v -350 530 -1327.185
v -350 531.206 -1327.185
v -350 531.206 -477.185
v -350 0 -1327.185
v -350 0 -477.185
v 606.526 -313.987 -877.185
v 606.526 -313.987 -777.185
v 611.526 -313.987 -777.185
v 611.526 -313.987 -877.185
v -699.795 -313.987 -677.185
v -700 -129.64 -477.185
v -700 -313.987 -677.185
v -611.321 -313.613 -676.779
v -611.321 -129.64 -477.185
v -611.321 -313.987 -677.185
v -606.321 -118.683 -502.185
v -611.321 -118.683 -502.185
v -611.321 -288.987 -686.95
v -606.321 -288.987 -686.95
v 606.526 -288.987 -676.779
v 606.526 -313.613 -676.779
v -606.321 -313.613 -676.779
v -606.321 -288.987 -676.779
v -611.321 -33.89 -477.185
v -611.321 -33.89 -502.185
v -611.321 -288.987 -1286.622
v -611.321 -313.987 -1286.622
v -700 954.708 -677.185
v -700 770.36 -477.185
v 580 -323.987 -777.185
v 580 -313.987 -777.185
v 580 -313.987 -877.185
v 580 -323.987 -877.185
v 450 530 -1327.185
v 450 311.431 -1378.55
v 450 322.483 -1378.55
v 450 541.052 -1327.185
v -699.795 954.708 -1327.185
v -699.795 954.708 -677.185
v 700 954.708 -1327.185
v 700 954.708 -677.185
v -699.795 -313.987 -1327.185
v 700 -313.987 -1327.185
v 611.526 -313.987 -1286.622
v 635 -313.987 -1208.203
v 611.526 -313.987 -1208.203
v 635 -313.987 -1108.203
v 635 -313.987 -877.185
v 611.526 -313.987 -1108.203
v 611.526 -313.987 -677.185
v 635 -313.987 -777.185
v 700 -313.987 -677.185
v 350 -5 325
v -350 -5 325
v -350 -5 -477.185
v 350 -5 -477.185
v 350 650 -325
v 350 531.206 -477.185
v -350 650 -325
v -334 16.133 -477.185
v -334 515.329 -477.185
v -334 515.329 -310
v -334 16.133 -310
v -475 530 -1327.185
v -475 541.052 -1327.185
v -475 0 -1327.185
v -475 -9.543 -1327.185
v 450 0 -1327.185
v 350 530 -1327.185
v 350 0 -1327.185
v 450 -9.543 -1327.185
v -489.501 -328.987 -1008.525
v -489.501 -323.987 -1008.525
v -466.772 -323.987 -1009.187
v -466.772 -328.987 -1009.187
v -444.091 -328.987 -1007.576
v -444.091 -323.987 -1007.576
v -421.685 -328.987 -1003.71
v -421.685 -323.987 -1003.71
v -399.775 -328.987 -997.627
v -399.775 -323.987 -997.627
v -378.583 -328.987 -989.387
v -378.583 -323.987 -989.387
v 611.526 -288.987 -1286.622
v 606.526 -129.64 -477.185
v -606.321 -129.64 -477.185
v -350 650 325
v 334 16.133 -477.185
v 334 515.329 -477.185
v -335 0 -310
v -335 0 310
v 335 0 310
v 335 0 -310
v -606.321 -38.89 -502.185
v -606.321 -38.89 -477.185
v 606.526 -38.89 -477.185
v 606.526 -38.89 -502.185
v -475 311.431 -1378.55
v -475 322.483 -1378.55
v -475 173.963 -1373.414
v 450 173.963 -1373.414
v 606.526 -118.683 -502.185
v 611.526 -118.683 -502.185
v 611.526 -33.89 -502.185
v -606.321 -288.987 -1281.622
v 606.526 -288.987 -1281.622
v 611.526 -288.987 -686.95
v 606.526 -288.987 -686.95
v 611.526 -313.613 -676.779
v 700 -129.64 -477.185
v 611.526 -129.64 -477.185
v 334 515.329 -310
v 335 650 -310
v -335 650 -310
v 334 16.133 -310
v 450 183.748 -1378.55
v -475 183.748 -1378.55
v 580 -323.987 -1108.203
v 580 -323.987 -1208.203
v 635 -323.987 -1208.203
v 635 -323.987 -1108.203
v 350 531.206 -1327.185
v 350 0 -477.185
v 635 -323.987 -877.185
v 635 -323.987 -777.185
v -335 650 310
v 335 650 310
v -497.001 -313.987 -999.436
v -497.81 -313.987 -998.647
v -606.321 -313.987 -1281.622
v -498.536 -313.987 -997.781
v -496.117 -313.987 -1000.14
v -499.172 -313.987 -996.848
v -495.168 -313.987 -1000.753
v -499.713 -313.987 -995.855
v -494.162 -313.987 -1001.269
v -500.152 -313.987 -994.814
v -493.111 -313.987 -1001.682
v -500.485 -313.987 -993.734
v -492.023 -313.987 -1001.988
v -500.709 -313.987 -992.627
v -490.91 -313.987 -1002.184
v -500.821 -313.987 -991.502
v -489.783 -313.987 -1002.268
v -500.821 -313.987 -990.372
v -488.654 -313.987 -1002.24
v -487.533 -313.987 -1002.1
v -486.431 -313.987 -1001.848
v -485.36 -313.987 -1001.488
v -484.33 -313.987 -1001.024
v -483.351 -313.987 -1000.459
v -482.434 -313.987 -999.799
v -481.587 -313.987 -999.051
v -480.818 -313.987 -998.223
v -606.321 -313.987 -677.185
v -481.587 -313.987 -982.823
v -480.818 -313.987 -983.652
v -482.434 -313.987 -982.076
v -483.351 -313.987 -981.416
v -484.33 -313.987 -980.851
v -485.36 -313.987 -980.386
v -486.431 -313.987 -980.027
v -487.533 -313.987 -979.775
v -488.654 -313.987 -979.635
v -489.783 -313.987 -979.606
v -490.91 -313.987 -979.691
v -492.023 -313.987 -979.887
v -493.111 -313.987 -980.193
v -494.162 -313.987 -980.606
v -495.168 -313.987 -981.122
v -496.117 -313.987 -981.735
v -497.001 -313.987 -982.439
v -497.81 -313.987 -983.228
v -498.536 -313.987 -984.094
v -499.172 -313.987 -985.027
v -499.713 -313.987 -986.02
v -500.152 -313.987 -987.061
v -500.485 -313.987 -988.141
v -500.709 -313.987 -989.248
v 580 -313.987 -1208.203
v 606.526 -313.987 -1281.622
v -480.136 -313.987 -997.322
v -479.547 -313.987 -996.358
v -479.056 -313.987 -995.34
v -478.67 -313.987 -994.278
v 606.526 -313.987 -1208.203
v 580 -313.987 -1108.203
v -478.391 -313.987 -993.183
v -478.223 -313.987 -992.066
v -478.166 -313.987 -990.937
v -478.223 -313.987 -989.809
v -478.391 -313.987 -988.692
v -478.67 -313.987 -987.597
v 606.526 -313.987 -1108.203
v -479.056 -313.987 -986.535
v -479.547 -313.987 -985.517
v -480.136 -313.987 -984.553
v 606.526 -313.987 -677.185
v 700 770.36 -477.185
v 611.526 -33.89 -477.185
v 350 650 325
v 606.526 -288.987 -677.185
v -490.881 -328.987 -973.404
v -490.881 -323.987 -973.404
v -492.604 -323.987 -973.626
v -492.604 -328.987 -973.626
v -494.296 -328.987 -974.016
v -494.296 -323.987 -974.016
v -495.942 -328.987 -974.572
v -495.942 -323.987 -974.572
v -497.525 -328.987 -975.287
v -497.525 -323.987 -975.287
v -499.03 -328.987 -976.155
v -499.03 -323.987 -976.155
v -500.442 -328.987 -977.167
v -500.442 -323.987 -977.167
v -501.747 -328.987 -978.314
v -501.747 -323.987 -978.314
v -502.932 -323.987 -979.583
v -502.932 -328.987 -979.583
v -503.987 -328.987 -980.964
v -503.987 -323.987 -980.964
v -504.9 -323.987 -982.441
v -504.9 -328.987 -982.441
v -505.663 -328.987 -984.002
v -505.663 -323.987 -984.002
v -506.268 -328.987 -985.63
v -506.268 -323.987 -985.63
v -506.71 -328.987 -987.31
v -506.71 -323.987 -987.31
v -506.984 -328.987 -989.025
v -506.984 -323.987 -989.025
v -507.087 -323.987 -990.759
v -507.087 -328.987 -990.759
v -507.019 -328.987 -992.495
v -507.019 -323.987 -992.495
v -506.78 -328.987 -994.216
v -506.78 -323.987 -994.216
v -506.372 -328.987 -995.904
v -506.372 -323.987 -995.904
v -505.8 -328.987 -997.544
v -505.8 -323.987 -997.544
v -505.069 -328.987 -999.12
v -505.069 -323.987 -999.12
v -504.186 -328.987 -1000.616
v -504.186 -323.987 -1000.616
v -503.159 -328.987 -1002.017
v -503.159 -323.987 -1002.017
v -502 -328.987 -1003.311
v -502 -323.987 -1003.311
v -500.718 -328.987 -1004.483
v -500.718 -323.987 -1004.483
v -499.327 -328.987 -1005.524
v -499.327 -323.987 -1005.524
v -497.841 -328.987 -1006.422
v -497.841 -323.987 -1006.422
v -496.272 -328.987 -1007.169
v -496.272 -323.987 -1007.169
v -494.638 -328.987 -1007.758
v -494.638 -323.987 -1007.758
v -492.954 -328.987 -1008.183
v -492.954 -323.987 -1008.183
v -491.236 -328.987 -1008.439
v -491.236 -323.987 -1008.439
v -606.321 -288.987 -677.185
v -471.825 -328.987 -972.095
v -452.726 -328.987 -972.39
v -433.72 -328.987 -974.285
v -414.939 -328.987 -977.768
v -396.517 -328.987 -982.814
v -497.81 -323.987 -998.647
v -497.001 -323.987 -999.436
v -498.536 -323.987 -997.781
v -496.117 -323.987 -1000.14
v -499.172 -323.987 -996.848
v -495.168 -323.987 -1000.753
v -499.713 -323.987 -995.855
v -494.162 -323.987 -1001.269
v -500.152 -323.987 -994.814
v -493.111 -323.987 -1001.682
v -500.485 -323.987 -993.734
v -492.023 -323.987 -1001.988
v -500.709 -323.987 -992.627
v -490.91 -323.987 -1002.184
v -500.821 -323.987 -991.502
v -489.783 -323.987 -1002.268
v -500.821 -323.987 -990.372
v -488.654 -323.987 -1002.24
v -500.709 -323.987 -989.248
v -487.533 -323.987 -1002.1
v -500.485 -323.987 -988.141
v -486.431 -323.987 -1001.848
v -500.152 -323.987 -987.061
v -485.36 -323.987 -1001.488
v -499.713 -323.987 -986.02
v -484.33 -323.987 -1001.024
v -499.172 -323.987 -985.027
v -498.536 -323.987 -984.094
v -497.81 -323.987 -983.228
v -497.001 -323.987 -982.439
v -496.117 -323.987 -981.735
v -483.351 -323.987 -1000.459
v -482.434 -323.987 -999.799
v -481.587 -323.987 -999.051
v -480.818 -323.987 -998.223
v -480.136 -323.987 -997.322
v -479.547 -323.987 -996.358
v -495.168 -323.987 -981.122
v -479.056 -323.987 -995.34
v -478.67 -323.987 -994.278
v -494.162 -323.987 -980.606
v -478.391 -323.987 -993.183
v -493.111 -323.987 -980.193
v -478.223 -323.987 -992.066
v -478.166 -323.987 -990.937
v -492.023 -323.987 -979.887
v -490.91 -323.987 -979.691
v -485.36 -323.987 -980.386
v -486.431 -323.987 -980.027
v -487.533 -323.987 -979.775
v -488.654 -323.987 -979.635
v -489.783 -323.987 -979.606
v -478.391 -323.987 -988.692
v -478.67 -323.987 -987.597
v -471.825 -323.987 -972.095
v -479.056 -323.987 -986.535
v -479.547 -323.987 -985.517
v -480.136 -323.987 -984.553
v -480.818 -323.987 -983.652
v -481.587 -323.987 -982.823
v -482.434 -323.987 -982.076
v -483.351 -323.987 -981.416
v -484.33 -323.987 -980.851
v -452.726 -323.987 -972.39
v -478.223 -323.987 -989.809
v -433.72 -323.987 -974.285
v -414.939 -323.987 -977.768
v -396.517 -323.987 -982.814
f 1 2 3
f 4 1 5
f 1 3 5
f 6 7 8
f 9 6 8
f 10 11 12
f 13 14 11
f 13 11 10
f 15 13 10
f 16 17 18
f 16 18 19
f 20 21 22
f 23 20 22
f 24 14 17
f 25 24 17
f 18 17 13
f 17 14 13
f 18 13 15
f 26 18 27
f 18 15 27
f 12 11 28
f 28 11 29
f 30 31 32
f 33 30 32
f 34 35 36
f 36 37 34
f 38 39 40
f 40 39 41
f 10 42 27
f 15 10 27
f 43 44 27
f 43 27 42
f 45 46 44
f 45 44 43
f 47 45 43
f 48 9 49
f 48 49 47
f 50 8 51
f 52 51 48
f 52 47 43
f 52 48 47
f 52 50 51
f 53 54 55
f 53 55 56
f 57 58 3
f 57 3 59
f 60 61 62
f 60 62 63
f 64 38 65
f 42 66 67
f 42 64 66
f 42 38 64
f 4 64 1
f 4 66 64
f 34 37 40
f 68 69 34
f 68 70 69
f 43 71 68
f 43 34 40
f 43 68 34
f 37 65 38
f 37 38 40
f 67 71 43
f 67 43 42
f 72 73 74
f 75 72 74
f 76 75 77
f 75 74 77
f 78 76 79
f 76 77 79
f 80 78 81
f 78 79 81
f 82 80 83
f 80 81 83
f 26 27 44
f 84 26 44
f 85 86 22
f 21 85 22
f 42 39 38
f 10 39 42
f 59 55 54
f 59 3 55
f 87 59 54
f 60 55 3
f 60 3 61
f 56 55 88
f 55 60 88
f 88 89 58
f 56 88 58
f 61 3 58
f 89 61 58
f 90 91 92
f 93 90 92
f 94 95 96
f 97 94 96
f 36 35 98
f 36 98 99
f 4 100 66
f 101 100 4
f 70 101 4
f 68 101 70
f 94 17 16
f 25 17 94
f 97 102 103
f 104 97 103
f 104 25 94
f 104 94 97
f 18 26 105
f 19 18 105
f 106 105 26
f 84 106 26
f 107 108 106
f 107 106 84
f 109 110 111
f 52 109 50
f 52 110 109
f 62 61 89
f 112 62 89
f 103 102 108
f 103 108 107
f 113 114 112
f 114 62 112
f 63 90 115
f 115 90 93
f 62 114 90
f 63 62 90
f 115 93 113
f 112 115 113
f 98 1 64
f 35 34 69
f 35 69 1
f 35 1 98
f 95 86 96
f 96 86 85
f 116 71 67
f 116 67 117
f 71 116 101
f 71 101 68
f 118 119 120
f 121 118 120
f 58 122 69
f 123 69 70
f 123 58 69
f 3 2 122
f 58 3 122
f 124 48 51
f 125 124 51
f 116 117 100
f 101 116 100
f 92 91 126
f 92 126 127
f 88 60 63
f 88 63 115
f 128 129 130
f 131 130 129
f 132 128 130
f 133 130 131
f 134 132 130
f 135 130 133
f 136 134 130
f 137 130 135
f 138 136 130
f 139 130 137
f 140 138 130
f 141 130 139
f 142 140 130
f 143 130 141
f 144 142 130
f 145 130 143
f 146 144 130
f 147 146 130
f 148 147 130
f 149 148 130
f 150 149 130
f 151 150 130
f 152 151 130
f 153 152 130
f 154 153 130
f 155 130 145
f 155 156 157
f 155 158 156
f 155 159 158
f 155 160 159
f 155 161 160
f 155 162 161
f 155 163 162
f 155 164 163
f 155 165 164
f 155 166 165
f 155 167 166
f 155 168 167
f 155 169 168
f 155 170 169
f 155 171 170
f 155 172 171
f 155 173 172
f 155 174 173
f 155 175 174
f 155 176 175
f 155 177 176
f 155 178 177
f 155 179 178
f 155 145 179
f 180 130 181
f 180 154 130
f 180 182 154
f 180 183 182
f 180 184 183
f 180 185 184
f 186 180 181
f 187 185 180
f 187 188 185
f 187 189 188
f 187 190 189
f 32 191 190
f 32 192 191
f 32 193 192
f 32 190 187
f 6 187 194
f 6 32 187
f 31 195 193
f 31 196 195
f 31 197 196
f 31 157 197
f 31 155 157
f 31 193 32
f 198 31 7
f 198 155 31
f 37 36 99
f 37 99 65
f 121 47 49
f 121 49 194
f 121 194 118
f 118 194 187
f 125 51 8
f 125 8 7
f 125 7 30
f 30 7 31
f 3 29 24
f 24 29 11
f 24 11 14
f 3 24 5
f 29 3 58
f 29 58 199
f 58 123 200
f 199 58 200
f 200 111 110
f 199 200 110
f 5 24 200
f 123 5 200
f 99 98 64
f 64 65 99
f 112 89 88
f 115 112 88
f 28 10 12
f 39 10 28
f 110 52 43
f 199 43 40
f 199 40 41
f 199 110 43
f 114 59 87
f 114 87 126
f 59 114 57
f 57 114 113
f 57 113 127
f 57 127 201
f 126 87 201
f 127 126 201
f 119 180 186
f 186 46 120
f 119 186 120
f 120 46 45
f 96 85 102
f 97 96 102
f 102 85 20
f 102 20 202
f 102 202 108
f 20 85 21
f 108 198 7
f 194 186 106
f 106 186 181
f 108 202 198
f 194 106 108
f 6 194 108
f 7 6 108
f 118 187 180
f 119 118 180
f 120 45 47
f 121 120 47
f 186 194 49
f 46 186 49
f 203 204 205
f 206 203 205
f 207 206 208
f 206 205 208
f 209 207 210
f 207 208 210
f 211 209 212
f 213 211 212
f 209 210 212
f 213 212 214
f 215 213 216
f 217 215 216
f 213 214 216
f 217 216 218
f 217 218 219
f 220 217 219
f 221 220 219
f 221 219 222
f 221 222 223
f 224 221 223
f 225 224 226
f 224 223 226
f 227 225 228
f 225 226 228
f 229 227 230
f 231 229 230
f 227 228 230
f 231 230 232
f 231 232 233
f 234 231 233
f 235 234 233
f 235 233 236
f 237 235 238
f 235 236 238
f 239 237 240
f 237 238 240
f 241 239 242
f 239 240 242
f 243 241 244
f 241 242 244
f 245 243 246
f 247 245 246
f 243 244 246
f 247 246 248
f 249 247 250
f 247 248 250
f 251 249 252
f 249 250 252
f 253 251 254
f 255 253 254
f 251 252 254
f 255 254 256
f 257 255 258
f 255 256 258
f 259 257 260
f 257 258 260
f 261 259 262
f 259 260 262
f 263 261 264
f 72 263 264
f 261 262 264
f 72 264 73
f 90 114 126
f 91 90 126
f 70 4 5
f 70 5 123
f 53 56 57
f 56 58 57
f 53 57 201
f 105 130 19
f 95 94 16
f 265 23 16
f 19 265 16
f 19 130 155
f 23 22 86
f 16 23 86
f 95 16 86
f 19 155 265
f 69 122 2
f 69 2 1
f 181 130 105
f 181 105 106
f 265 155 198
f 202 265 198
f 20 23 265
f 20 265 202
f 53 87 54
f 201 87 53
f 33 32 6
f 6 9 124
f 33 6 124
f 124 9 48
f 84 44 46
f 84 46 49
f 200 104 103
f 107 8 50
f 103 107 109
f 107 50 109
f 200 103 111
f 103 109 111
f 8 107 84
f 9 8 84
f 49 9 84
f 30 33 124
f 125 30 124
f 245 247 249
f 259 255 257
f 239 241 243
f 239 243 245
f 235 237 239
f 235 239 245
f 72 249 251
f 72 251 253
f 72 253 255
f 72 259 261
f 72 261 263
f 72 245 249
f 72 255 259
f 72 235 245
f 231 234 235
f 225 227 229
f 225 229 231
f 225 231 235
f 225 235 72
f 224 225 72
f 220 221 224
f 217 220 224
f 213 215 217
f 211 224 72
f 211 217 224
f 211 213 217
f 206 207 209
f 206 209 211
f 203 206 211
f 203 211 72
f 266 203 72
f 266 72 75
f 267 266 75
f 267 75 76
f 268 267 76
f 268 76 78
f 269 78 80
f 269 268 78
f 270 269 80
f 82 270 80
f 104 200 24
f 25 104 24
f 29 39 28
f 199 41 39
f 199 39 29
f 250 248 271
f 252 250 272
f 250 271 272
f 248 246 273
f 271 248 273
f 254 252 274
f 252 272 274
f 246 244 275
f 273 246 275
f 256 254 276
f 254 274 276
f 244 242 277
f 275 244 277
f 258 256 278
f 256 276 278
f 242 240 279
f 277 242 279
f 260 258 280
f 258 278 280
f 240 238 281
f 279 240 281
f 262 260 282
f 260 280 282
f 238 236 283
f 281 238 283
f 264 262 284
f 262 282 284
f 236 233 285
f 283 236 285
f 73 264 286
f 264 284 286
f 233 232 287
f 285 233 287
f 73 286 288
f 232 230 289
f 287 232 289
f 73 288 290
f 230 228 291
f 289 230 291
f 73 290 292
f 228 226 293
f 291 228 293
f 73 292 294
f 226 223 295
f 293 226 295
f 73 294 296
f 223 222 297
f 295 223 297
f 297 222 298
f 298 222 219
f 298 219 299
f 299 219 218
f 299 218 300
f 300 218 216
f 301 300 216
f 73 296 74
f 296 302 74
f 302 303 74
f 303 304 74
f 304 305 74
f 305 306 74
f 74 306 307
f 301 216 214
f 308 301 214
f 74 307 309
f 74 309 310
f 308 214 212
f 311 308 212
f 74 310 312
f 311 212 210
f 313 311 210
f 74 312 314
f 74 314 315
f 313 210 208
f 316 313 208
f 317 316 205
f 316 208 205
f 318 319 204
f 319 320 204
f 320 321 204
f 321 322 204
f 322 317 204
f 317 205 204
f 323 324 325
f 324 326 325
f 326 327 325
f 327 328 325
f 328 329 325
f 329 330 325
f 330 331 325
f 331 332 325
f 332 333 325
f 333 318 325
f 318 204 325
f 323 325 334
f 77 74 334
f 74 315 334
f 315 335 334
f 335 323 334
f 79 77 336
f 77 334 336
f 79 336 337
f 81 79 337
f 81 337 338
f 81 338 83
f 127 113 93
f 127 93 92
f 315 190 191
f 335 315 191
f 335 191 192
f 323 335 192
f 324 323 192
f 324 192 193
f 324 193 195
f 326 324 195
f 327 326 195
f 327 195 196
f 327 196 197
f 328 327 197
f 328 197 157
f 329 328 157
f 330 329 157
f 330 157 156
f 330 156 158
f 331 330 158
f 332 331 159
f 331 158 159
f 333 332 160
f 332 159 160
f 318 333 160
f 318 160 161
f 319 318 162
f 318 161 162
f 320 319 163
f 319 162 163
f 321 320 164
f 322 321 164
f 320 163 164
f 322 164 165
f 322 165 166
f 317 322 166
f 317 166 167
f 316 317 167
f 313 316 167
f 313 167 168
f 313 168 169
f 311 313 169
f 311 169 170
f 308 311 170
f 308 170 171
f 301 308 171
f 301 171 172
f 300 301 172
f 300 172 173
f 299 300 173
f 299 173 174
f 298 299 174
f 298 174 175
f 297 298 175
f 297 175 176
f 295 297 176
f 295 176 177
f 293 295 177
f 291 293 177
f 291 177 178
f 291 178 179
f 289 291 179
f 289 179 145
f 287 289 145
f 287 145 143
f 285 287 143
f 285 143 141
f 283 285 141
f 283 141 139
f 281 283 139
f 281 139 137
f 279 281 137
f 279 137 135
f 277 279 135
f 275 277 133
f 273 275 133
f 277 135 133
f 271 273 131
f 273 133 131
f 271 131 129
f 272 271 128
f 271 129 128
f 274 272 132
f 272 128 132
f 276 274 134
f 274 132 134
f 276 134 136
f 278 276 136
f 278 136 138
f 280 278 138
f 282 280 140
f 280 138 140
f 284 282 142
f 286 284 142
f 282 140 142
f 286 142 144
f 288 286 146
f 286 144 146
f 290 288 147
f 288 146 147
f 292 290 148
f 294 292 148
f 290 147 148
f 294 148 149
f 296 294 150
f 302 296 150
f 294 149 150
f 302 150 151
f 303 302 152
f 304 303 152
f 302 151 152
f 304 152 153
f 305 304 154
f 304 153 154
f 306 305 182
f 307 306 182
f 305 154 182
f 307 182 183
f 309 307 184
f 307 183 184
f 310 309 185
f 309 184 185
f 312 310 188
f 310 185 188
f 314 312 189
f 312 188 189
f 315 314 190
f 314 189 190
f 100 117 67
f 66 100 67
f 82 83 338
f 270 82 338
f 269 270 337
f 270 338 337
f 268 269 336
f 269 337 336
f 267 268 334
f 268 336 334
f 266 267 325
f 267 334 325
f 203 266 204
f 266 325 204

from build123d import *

# Parameters (mm, degrees)
F0_W      = 700
F0_H      = 650
F0_W_2    = 670
F0_H_2    = 620
F1_DEPTH  = 650
F3_DEPTH  = 700
F4_W      = 1400
F4_H      = 900
F4_W_2    = 700
F4_H_2    = 531.2062842084
F5_DEPTH  = 200
F7_DEPTH  = 1400
F8_W      = 1399.7949943277
F8_H      = 1268.6949958977
F8_W_2    = 700
F8_H_2    = 531.2062842084
F9_DEPTH  = 650
F10_W     = 1222.8473691637
F10_H     = 0.4061281681
F10_W_2   = 1212.8473691637
F10_H_2   = 5
F11_DEPTH = 25
F12_W     = 5
F12_H     = 271.4476656914
F13_DEPTH = 25
F15_DEPTH = 25
F16_R     = 11.3345027625
F17_DEPTH = 5
F18_DEPTH = 10
F20_DEPTH = 5
F21_W     = 668
F21_H     = 499.1960943538
F22_DEPTH = 170
F23_W     = 700
F23_H     = 802.1854579449
F24_DEPTH = 5
F26_DEPTH = 1175
F28_DEPTH = 250
F30_DEPTH = 250


# Not quite as in the source:
# - a feature names something its author has since deleted; it is built from what else it names


with BuildPart() as f1:
    # F0 (on Front) → F1 (new body)
    with BuildSketch(Plane.XZ):
        Rectangle(F0_W, F0_H)
        Rectangle(F0_W_2, F0_H_2, mode=Mode.SUBTRACT)
    extrude(amount=-F1_DEPTH)

    # F2 (on face) → F3 (join)
    with BuildSketch(Plane.YZ.offset(350)):
        Polygon((531.2062842084, -477.1854579449), (650, -325), (0, -325), (0, -477.1854579449), align=None)
    extrude(amount=-F3_DEPTH)

    # F21 (on face) → F22 (cut)
    with BuildSketch(Plane(origin=(0, 0, -477.1854579449), x_dir=(1, 0, 0), z_dir=(0, 0, -1))):
        with Locations((0, -265.7305951914)):
            Rectangle(F21_W, F21_H)
    extrude(amount=-F22_DEPTH, mode=Mode.SUBTRACT)

    # F23 (on face) → F24 (join)
    with BuildSketch(Plane.XZ):
        with Locations((0, -76.0927289724)):
            Rectangle(F23_W, F23_H)
    extrude(amount=F24_DEPTH)


with BuildPart() as f5:
    # F4 (on face) → F5 (new body)
    with BuildSketch(Plane(origin=(0, 0, -477.1854579449), x_dir=(1, 0, 0), z_dir=(0, 0, -1))):
        with Locations((0, -320.3603625298)):
            Rectangle(F4_W, F4_H)
        with Locations((0, -265.6031421042)):
            Rectangle(F4_W_2, F4_H_2, mode=Mode.SUBTRACT)
    extrude(amount=F5_DEPTH)

    # F6 (on face) → F7 (join)
    with BuildSketch(Plane.YZ.offset(700)):
        Polygon((-129.6396374702, -677.1854579449), (-129.6396374702, -477.1854579449), (-313.9871354191, -677.1854579449), align=None)
        Polygon((770.3603625298, -477.1854579449), (770.3603625298, -677.1854579449), (954.7078604786, -677.1854579449), align=None)
    extrude(amount=-F7_DEPTH)

    # F8 (on face) → F9 (join)
    with BuildSketch(Plane(origin=(0, 0, -677.1854579449), x_dir=(1, 0, 0), z_dir=(0, 0, -1))):
        with Locations((0.1025028361, -320.3603625298)):
            Rectangle(F8_W, F8_H)
        with Locations((0, -265.6031421042)):
            Rectangle(F8_W_2, F8_H_2, mode=Mode.SUBTRACT)
    extrude(amount=F9_DEPTH)

    # F10 (on face) → F11 (cut)
    with BuildSketch(Plane.XZ.offset(313.9871354191)):
        with Locations((0.1025028361, -1327.3885220289)):
            Rectangle(F10_W, F10_H)
        Polygon((-606.3211817457, -677.1854579449), (-611.3211817457, -677.1854579449), (-611.3211817457, -1286.6218090057), (-606.3211817457, -1286.6218090057), (-606.3211817457, -1281.6218090057), align=None)
        Polygon((611.526187418, -1286.6218090057), (611.526187418, -677.1854579449), (606.526187418, -677.1854579449), (606.526187418, -1281.6218090057), (606.526187418, -1286.6218090057), align=None)
        Polygon((611.526187418, -676.7793297768), (-611.3211817457, -676.7793297768), (-611.3211817457, -677.1854579449), (-606.3211817457, -677.1854579449), (606.526187418, -677.1854579449), (611.526187418, -677.1854579449), align=None)
        with Locations((0.1025028361, -1284.1218090057)):
            Rectangle(F10_W_2, F10_H_2)
    extrude(amount=-F11_DEPTH, mode=Mode.SUBTRACT)

    # F12 (on face) → F13 (cut)
    with BuildSketch(Plane(origin=(0, 167.7119856609, -154.5864246631), x_dir=(1, 0, 0), z_dir=(0, -0.7352941176, 0.6777481542))):
        with Locations((609.026187418, -574.458518109)):
            Rectangle(F12_W, F12_H)
        with Locations((-608.8211817457, -574.458518109)):
            Rectangle(F12_W, F12_H)
    extrude(amount=-F13_DEPTH, mode=Mode.SUBTRACT)

    # F14 (on face) → F15 (cut)
    with BuildSketch(Plane.XY.offset(-477.1854579449)):
        Polygon((611.526187418, -33.8904465006), (-611.3211817457, -33.8904465006), (-611.3211817457, -129.6396374702), (-606.3211817457, -129.6396374702), (-606.3211817457, -38.8904465006), (606.526187418, -38.8904465006), (606.526187418, -129.6396374702), (611.526187418, -129.6396374702), align=None)
    extrude(amount=-F15_DEPTH, mode=Mode.SUBTRACT)

    # F16 (on face) → F17 (join)
    with BuildSketch(Plane.XZ.offset(313.9871354191)):
        Polygon((635, -1108.2031965256), (580, -1108.2031965256), (580, -1208.2031965256), (635, -1208.2031965256), (635, -1168.8231229782), align=None)
        Polygon((635, -777.1854579449), (580, -777.1854579449), (580, -877.1854579449), (635, -877.1854579449), (635, -808.090031147), align=None)
        with Locations((-489.5007610321, -990.9374713898)):
            Circle(F16_R)
    extrude(amount=F17_DEPTH)

    # F16 (on face) → F18 (join)
    with BuildSketch(Plane.XZ.offset(313.9871354191)):
        Polygon((635, -1108.2031965256), (580, -1108.2031965256), (580, -1208.2031965256), (635, -1208.2031965256), (635, -1168.8231229782), align=None)
        Polygon((635, -777.1854579449), (580, -777.1854579449), (580, -877.1854579449), (635, -877.1854579449), (635, -808.090031147), align=None)
        with Locations((-489.5007610321, -990.9374713898)):
            Circle(F16_R)
    extrude(amount=F18_DEPTH)

    # F19 (on face) → F20 (join)
    with BuildSketch(Plane.XZ.offset(323.9871354191)):
        with BuildLine():
            ThreePointArc((-489.5007610321, -1008.5250073511), (-477.0644950895, -1003.3737373324), (-471.9132250707, -990.9374713898))
            ThreePointArc((-471.9132250707, -990.9374713898), (-477.5624320948, -978.0224520952), (-490.8809444539, -973.4041740697))
            ThreePointArc((-490.8809444539, -973.4041740697), (-507.074732102, -991.6280957645), (-489.5007610321, -1008.5250073511))
        make_face()
        with BuildLine():
            ThreePointArc((-490.8809444539, -973.4041740697), (-477.5624320948, -978.0224520952), (-471.9132250707, -990.9374713898))
            ThreePointArc((-471.9132250707, -990.9374713898), (-477.0644950895, -1003.3737373324), (-489.5007610321, -1008.5250073511))
            ThreePointArc((-489.5007610321, -1008.5250073511), (-432.8396587778, -1005.9231706341), (-378.5828948021, -989.3867373466))
            ThreePointArc((-378.5828948021, -989.3867373466), (-433.7199381181, -974.2849848856), (-490.8809444539, -973.4041740697))
        make_face()
    extrude(amount=F20_DEPTH)

    # F25 (on face) → F26 (join)
    with BuildSketch(Plane.YZ.offset(700)):
        Polygon((173.9625222218, -1373.4135972352), (0, -1327.1854579449), (-9.543454825, -1327.1854579449), (183.7482365325, -1378.5500571563), align=None)
        Polygon((541.05185, -1327.1854579449), (530, -1327.1854579449), (311.4313689114, -1378.5500571563), (322.4832189114, -1378.5500571563), align=None)
    extrude(amount=-F26_DEPTH)

    # F27 (on face) → F28 (cut)
    with BuildSketch(Plane.YZ.offset(700)):
        Polygon((-9.543454825, -1327.1854579449), (183.7482365325, -1378.5500571563), (173.9625222218, -1373.4135972352), (0, -1327.1854579449), align=None)
    extrude(amount=-F28_DEPTH, mode=Mode.SUBTRACT)

    # F29 (on face) → F30 (cut)
    with BuildSketch(Plane.YZ.offset(700)):
        Polygon((530, -1327.1854579449), (311.4313689114, -1378.5500571563), (322.4832189114, -1378.5500571563), (541.05185, -1327.1854579449), align=None)
    extrude(amount=-F30_DEPTH, mode=Mode.SUBTRACT)


solid = Compound([f1.part, f5.part])
